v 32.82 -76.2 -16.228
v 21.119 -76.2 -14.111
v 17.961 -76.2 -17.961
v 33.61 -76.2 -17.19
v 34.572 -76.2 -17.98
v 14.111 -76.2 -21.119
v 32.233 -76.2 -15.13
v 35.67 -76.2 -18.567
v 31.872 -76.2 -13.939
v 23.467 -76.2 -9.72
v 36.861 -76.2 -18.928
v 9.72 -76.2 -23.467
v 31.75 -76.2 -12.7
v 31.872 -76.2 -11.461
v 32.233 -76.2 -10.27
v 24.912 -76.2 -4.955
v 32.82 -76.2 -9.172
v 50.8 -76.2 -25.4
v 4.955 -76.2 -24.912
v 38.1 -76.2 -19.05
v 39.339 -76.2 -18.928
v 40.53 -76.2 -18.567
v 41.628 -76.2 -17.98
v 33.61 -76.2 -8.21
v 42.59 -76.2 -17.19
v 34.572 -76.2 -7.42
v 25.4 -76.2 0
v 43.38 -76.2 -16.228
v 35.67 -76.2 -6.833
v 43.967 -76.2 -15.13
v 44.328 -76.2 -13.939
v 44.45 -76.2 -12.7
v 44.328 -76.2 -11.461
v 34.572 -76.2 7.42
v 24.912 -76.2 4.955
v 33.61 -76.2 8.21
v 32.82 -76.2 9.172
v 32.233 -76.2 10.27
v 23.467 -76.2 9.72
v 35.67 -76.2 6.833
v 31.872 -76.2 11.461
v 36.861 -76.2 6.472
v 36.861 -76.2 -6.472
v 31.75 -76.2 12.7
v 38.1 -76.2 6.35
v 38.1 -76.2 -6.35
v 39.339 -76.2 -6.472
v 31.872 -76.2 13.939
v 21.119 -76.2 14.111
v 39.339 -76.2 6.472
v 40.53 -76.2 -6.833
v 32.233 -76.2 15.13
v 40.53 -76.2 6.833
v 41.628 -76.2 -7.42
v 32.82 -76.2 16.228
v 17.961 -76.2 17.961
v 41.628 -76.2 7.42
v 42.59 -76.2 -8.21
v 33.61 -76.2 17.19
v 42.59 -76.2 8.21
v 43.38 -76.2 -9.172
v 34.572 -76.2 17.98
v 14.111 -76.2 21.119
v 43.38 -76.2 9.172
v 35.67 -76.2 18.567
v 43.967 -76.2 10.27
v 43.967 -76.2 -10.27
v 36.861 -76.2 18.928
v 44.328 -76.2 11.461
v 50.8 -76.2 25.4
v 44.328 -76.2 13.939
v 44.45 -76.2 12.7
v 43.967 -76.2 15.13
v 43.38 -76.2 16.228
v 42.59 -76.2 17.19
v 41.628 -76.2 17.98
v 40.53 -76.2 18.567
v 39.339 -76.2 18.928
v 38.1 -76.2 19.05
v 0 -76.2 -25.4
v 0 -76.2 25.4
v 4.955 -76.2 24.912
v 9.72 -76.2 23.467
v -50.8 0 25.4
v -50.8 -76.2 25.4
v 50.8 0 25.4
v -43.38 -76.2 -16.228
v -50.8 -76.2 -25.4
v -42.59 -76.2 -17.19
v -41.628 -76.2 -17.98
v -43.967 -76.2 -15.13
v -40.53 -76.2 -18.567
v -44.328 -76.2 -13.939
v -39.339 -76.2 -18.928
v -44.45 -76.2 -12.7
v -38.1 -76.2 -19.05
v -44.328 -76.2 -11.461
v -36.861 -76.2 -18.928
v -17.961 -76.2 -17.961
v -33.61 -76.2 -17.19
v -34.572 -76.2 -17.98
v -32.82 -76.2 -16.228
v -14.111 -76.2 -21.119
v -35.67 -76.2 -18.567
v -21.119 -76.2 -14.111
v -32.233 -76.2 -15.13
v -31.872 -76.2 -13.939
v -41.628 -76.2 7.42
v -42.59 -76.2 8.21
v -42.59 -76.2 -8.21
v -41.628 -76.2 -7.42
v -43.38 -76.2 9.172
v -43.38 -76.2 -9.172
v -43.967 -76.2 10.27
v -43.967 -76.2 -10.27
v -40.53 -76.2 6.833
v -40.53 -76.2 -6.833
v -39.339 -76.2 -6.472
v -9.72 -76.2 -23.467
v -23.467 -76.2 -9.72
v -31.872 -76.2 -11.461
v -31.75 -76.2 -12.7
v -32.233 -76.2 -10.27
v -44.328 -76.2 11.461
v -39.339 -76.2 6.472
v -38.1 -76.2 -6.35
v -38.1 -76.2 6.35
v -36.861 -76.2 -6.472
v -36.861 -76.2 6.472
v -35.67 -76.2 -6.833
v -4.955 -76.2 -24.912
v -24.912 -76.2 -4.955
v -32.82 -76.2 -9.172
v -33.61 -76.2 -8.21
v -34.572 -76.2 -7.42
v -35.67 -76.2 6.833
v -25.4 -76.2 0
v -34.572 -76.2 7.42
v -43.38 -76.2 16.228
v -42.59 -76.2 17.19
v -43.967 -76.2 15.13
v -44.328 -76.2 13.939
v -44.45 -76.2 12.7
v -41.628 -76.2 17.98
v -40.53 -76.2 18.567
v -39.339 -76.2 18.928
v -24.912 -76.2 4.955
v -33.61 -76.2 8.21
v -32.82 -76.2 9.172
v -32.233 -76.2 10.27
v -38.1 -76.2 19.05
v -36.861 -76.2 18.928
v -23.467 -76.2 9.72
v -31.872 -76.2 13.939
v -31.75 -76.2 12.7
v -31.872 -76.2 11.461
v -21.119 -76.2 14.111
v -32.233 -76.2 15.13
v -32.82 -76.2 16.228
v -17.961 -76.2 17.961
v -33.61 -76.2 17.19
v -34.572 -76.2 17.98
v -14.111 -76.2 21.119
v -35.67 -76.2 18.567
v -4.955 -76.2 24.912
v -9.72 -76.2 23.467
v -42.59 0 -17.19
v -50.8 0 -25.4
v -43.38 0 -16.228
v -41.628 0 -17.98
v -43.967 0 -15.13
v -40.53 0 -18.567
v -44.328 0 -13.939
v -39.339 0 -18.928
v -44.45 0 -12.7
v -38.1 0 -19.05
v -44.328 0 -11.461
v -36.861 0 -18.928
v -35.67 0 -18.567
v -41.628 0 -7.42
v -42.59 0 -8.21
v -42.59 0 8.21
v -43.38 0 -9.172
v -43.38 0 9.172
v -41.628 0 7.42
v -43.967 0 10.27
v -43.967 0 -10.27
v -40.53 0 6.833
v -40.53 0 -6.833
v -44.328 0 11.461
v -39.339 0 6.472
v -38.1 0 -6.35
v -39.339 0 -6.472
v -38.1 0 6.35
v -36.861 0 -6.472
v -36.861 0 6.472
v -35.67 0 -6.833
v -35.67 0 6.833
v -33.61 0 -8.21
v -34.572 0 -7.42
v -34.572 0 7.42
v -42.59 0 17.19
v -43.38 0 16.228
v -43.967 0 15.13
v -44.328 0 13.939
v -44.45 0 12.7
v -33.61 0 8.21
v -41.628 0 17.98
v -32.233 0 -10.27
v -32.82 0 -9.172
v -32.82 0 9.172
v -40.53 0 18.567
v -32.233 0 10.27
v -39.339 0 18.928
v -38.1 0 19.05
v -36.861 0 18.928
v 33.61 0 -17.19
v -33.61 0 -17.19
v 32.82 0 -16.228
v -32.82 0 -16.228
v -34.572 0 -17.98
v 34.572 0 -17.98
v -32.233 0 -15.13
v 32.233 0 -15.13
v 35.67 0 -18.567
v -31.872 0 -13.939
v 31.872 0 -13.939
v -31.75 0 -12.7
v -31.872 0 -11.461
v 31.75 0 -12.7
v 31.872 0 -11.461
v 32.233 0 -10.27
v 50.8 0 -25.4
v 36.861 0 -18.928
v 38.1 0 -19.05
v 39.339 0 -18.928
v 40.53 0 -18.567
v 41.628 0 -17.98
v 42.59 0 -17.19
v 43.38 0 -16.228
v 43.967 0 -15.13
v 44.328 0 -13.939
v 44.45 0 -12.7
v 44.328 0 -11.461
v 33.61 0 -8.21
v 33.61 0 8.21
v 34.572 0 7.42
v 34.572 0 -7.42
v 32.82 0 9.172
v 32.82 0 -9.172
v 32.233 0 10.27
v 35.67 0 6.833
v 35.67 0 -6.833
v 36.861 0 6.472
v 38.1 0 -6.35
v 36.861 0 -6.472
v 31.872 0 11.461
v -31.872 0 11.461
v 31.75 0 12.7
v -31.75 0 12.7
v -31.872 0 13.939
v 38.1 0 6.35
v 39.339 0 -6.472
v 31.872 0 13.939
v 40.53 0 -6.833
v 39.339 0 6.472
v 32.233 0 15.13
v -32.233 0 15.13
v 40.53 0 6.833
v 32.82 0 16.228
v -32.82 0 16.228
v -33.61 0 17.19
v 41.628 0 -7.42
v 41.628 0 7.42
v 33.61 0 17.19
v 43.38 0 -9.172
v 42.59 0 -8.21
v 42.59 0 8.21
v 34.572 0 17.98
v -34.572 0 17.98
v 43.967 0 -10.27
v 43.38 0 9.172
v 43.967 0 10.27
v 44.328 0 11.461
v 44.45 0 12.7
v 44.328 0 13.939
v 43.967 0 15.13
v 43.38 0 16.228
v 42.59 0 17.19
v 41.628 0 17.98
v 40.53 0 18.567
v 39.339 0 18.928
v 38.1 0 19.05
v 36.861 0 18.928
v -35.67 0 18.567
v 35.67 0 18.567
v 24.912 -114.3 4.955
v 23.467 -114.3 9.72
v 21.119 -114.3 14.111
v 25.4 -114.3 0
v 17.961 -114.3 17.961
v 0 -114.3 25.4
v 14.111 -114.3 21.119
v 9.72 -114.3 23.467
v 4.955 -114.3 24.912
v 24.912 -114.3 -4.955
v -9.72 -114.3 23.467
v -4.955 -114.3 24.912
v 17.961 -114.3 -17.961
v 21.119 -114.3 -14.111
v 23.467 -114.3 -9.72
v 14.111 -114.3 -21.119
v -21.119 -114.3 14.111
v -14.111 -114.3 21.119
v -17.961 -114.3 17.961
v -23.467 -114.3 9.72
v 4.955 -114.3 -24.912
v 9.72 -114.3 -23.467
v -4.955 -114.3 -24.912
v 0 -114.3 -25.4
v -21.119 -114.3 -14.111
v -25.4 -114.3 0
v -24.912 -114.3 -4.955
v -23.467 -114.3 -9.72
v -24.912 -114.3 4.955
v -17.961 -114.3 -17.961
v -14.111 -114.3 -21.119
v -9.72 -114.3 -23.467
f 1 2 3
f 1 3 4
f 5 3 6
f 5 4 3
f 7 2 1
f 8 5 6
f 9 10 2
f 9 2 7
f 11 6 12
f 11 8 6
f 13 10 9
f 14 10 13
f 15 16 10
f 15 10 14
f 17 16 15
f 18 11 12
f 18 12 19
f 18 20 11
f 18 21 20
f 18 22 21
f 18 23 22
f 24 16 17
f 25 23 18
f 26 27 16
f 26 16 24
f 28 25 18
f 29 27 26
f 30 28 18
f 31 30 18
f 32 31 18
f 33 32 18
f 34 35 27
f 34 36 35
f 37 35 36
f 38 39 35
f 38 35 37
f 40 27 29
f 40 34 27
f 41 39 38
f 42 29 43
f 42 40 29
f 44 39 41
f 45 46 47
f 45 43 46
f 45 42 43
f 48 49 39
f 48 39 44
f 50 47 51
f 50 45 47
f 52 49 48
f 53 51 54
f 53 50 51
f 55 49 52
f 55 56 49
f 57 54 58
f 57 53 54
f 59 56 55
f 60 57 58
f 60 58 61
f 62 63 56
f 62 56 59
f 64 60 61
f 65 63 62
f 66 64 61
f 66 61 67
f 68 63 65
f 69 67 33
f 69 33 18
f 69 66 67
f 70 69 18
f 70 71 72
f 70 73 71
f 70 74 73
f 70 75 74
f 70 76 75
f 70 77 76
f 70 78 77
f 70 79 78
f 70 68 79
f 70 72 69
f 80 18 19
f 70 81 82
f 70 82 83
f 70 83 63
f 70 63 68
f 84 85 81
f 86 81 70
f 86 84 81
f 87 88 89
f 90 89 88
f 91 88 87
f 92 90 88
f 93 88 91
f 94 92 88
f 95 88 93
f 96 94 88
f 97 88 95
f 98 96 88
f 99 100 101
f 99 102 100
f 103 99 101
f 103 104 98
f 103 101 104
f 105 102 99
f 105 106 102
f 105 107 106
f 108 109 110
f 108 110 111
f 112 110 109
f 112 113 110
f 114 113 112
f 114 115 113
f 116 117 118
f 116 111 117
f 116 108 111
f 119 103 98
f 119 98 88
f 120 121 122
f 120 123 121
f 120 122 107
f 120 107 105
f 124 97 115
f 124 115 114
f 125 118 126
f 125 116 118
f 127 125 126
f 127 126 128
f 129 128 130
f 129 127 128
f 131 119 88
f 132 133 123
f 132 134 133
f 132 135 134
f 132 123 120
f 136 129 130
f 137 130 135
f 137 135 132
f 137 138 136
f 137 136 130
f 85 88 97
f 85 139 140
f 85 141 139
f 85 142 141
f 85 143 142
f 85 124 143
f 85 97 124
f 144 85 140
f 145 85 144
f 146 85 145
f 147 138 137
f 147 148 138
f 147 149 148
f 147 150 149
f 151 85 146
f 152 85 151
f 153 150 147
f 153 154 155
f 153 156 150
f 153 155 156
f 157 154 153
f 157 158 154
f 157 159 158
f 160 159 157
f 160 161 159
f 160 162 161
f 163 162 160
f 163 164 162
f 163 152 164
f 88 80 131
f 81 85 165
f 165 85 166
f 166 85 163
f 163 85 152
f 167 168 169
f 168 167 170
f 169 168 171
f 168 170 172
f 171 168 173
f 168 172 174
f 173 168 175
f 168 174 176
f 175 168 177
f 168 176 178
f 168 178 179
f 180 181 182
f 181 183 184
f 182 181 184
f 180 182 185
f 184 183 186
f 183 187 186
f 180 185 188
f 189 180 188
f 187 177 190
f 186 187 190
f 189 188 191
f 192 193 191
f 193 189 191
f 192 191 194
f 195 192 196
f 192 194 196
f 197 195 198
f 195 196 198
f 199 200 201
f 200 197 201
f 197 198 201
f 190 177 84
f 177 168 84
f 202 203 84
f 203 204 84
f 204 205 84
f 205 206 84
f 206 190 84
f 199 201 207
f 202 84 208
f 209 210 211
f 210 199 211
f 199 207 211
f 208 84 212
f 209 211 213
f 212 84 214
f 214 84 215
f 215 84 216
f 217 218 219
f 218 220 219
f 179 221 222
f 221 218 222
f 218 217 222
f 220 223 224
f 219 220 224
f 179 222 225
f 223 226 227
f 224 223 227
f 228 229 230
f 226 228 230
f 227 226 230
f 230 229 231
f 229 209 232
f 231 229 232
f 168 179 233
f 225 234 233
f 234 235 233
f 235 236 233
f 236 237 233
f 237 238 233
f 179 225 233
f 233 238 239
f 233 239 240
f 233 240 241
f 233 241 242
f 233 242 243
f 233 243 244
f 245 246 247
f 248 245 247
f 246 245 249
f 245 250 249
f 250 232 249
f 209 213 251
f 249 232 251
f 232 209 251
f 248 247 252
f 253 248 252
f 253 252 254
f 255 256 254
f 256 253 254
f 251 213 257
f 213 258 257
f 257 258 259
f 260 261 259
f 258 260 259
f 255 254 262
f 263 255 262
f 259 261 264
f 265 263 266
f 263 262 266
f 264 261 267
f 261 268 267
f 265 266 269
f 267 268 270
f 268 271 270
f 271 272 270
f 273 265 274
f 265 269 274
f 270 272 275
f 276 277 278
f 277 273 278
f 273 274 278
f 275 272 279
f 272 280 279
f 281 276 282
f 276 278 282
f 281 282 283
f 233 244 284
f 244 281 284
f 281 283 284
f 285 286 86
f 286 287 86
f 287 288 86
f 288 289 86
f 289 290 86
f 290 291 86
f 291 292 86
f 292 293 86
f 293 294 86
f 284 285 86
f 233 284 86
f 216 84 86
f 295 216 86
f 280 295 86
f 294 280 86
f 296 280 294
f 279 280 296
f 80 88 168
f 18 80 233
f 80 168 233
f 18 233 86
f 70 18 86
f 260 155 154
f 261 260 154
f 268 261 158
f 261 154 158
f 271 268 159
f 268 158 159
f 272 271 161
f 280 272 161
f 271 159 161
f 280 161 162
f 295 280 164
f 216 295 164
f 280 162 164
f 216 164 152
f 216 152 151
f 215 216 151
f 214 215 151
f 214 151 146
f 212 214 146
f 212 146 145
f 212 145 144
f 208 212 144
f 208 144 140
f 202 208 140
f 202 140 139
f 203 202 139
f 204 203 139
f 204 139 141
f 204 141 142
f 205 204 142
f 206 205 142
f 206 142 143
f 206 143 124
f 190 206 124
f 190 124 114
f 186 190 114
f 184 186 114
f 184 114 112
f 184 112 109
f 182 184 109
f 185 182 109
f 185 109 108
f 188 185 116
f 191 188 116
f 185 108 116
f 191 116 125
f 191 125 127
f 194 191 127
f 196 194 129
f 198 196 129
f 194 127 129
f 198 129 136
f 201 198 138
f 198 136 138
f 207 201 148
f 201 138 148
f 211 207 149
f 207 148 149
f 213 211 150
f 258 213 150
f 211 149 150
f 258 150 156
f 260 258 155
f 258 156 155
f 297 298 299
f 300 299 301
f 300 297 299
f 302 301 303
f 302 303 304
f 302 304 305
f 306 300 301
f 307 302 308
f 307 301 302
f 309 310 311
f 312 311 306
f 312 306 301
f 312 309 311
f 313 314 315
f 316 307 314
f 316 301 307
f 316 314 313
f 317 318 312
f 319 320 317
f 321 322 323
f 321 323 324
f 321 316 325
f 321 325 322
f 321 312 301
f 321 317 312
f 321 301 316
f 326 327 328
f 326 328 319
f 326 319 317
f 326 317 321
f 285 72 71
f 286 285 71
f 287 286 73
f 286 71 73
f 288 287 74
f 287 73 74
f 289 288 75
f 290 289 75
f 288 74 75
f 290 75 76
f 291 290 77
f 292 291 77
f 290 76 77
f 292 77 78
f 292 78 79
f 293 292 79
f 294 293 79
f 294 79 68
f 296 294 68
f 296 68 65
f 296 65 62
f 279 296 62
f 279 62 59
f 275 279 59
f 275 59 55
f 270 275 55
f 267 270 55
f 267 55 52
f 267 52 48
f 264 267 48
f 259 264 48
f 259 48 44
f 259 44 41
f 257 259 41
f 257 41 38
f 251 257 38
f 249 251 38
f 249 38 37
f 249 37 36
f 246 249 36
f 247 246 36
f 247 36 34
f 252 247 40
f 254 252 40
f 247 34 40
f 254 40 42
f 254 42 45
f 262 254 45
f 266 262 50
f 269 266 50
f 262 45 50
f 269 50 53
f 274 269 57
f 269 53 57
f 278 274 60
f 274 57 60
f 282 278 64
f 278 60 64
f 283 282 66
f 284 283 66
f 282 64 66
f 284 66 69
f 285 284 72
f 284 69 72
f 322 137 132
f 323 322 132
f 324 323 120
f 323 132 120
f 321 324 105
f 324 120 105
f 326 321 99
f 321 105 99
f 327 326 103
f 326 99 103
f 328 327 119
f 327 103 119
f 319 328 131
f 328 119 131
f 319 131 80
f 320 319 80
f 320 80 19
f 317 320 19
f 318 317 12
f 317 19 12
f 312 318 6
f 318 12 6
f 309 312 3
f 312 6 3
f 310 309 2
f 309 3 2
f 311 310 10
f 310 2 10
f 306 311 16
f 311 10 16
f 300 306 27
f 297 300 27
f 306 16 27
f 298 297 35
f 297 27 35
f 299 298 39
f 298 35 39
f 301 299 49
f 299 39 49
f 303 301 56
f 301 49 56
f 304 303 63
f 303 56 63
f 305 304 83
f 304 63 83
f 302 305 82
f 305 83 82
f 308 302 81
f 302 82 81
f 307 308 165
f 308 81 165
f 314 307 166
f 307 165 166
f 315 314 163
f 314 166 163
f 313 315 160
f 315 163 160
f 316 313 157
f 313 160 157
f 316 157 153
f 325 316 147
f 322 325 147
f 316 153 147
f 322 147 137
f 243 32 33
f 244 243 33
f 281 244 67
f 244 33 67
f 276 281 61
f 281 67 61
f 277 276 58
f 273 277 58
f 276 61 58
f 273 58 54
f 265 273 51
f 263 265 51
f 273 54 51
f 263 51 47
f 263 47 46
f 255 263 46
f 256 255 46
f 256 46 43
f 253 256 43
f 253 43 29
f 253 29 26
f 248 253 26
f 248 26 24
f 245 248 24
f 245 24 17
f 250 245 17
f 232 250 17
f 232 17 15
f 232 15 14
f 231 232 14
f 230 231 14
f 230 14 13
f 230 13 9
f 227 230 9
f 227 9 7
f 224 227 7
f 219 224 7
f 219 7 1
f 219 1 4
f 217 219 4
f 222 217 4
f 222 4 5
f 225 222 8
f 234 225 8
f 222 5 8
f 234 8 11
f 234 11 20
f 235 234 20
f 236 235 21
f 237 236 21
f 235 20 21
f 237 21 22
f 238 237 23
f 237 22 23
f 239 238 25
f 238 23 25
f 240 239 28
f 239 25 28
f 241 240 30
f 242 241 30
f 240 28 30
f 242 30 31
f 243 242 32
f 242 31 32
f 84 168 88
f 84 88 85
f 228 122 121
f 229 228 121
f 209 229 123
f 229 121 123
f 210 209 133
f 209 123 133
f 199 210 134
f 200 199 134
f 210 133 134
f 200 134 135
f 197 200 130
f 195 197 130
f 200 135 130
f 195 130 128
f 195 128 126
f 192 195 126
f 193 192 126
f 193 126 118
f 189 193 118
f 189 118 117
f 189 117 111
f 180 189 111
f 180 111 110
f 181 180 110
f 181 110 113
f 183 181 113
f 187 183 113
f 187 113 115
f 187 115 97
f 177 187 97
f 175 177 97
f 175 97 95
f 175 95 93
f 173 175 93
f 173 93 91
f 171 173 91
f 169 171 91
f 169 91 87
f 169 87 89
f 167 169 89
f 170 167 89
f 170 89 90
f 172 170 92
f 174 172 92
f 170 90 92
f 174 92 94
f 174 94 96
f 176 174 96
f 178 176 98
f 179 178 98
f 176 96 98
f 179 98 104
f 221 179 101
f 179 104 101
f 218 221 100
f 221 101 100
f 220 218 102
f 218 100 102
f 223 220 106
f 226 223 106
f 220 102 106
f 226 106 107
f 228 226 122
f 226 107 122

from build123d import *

# Parameters (mm, degrees)
F0_W     = 101.6
F0_H     = 50.8
F1_DEPTH = 76.2
F2_R     = 6.35
F3_DEPTH = 76.201
F4_W     = 25.4
F4_H     = 38.1


with BuildPart() as f1:
    # F0 (on Front) → F1 (new body)
    with BuildSketch(Plane.XZ):
        Rectangle(F0_W, F0_H)
    extrude(amount=F1_DEPTH)

    # F2 (on face) → F3 (cut, through all)
    with BuildSketch(Plane.XZ.offset(76.2)):
        with Locations((-38.1, 12.7)):
            Circle(F2_R)
        with Locations((-38.1, -12.7)):
            Circle(F2_R)
        with Locations((38.1, 12.7)):
            Circle(F2_R)
        with Locations((38.1, -12.7)):
            Circle(F2_R)
    extrude(amount=-F3_DEPTH, mode=Mode.SUBTRACT)

    # F4 (on Top) → F5 (revolve)
    with BuildSketch(Plane.XY):
        with Locations((-12.7, -95.25)):
            Rectangle(F4_W, F4_H)
    revolve(axis=Axis((0, -95.25, 0), (0, -1, 0)))


solid = f1.part
